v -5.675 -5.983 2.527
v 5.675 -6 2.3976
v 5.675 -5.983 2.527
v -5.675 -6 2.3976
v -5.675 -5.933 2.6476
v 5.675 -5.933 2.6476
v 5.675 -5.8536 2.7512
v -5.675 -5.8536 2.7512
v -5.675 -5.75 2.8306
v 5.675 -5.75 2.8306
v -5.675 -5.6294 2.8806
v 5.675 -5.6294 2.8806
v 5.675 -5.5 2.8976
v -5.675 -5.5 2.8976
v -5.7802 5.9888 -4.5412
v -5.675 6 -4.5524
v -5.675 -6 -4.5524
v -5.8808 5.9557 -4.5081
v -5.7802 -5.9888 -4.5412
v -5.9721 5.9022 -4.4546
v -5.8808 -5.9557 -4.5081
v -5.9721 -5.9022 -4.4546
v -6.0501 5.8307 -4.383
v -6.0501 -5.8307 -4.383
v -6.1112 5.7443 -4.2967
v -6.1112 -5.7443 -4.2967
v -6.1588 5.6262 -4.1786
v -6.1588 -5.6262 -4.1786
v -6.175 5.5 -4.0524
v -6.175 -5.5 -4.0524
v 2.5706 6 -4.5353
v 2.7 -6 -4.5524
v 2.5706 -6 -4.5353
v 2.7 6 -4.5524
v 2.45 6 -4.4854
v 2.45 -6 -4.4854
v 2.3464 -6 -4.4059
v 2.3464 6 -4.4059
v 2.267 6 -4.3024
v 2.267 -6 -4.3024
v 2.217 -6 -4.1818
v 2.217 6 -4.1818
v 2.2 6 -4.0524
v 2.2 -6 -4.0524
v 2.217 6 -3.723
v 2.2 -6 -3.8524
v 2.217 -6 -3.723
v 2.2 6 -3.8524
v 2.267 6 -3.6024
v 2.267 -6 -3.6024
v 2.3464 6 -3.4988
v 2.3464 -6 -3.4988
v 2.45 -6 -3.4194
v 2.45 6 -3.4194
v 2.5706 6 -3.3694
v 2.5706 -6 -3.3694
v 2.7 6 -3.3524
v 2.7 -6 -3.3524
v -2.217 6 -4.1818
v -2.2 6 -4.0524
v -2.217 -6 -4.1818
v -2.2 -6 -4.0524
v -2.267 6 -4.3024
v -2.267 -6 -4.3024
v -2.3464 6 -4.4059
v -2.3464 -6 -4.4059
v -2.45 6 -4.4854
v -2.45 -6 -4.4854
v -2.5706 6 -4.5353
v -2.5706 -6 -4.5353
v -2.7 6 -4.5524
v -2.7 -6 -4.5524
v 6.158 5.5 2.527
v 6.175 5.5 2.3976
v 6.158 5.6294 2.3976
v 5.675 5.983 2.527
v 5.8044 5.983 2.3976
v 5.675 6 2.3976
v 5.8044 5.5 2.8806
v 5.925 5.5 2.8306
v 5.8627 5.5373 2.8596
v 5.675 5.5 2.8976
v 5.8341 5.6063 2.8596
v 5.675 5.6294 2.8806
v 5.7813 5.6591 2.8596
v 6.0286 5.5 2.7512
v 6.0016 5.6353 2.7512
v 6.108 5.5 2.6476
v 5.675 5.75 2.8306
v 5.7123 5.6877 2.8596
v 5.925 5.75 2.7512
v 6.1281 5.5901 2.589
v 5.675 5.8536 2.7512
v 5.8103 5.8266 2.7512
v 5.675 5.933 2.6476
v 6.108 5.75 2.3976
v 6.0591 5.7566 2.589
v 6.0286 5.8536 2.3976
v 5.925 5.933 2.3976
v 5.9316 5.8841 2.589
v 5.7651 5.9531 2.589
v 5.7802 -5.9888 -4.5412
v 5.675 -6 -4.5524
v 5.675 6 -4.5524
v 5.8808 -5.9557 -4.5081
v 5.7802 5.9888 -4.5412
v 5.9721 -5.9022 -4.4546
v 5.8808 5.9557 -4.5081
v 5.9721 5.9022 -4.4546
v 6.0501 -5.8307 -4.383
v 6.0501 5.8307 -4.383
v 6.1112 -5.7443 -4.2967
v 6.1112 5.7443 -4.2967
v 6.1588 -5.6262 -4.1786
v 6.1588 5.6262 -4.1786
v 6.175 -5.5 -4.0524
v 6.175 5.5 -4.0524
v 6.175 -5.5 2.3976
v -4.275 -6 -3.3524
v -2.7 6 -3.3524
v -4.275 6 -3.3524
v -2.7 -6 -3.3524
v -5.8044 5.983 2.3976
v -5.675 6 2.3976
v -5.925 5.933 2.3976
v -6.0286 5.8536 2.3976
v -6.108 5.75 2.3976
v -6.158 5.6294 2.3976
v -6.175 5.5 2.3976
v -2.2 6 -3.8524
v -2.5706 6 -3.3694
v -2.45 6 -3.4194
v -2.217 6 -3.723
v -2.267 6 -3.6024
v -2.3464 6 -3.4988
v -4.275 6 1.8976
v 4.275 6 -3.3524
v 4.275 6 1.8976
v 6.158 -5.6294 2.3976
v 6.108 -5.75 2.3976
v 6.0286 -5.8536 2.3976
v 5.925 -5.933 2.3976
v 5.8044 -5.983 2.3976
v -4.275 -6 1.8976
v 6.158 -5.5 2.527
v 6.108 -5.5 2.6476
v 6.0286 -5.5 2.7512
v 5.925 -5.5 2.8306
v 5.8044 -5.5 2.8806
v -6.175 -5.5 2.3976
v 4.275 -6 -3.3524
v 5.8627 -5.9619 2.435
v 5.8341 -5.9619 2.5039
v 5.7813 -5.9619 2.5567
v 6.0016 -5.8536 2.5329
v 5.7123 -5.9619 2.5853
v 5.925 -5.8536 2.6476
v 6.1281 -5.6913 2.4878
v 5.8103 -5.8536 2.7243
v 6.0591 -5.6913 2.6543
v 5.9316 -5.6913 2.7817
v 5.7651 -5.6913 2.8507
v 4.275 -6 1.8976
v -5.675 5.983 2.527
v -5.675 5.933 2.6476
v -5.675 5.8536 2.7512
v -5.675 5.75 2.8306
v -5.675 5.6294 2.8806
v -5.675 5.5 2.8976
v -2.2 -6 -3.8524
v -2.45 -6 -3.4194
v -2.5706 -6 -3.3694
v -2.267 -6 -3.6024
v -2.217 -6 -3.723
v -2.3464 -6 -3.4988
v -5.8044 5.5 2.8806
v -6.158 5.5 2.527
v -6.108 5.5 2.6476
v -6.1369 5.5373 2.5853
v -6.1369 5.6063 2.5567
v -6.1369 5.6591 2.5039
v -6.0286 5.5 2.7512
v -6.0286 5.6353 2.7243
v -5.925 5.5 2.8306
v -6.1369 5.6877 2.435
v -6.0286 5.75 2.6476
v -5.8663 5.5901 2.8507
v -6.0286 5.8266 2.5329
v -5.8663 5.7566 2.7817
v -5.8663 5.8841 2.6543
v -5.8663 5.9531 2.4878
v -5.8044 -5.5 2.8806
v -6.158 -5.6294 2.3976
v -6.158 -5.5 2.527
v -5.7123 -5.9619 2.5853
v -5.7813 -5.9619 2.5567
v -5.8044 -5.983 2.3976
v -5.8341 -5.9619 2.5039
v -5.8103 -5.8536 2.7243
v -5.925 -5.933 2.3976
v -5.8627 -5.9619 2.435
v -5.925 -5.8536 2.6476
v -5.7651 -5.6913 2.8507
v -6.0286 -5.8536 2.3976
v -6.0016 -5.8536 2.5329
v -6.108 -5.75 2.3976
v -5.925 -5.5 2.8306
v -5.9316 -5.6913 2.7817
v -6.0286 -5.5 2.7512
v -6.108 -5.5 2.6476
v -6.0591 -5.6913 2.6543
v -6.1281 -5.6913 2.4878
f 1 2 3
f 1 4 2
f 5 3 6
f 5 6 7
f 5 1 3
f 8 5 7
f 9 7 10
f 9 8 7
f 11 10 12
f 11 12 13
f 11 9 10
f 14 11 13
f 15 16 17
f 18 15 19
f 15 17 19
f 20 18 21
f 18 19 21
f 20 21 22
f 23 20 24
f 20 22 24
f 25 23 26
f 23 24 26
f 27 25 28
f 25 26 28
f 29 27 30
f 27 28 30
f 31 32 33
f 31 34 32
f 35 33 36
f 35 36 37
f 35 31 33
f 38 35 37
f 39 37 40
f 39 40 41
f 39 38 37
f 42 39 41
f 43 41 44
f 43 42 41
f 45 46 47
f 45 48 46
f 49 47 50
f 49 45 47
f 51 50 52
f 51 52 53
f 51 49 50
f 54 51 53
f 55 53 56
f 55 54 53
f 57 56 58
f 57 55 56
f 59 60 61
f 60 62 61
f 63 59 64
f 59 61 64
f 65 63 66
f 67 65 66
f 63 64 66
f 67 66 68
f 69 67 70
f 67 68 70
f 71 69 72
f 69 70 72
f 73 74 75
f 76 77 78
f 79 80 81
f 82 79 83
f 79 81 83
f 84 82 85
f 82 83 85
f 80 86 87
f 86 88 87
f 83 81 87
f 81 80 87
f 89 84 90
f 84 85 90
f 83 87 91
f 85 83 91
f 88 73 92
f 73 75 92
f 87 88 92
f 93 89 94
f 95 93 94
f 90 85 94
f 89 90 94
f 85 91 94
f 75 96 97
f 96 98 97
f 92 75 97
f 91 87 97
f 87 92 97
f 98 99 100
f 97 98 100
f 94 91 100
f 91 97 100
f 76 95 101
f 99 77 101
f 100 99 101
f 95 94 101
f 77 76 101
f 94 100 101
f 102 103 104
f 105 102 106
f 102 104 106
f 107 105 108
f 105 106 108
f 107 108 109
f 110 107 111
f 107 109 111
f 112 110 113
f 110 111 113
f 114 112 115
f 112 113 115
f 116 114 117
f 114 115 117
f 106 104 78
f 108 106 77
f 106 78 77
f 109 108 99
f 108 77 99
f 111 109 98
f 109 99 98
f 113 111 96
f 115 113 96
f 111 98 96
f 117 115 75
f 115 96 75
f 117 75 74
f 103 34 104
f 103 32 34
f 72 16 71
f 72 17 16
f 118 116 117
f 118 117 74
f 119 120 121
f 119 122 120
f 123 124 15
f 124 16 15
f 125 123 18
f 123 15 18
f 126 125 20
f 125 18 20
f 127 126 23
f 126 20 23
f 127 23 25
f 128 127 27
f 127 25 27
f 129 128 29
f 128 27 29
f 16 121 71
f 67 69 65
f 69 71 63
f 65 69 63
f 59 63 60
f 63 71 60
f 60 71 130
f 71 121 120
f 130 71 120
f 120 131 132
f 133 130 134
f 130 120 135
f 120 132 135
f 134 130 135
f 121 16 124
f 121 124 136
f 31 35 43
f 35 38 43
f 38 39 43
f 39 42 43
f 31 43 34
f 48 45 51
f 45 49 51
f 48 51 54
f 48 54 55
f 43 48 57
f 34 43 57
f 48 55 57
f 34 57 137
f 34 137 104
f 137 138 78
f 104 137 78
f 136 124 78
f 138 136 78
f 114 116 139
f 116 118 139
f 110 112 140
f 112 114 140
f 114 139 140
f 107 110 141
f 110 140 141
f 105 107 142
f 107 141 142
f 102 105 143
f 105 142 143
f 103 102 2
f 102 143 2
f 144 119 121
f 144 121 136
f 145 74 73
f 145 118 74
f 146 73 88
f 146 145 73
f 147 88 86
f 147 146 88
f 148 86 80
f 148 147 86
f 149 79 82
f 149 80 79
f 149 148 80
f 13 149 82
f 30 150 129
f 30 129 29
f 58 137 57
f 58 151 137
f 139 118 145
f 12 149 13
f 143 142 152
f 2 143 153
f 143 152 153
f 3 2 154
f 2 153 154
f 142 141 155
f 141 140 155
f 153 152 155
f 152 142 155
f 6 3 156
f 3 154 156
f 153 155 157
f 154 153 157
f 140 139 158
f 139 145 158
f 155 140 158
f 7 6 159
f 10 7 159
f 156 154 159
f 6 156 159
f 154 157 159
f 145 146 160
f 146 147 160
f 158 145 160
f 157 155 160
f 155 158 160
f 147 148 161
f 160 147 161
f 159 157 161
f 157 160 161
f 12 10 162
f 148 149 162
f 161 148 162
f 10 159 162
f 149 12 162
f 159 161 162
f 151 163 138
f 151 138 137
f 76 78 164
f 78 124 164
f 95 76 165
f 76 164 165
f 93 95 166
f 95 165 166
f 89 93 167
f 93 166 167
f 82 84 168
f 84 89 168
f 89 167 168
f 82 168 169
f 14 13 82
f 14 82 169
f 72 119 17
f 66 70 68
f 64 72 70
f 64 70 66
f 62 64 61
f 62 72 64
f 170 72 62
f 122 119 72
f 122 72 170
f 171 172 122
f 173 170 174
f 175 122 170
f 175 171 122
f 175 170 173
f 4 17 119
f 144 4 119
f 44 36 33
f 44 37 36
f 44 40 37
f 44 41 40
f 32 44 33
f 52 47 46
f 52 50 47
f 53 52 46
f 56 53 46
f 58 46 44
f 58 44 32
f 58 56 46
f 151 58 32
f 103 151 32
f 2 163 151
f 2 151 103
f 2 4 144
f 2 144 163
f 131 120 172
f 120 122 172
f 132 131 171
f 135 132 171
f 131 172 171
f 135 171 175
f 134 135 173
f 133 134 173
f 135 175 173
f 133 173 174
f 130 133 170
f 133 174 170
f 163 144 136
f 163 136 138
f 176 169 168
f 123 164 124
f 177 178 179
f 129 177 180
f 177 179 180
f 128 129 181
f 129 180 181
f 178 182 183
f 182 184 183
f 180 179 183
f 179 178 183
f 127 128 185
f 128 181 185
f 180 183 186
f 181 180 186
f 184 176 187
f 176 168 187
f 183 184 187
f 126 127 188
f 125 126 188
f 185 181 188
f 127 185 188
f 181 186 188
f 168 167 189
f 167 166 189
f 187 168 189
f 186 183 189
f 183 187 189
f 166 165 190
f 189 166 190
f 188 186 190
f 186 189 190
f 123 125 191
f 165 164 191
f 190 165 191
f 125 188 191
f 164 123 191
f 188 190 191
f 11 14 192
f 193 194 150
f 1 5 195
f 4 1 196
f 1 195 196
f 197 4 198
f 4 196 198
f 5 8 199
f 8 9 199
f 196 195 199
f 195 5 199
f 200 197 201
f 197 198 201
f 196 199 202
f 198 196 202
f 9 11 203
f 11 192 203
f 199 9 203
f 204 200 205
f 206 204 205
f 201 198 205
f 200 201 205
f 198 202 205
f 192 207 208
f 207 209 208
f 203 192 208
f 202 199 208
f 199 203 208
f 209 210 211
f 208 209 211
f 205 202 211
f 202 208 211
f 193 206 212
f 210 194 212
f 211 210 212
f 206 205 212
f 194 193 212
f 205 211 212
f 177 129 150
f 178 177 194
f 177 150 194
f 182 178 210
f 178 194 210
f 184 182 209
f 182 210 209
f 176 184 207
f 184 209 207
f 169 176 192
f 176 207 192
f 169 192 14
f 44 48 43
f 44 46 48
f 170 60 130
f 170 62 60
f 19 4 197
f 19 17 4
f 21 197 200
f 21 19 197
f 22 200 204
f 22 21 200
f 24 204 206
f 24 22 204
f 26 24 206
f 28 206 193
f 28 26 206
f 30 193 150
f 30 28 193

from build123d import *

# Parameters (mm, degrees)
F1_DEPTH = 6
F2_R     = 0.5
F3_R     = 0.5


with BuildPart() as f1:
    # F0 (on Front) → F1 (new body, symmetric)
    with BuildSketch(Plane.XZ):
        Polygon((6.175, -4.5523648744), (6.175, 2.8976351256), (-6.175, 2.8976351256), (-6.175, -4.5523648744), (-2.2, -4.5523648744), (-2.2, -3.3523648744), (-4.275, -3.3523648744), (-4.275, 1.8976351256), (4.275, 1.8976351256), (4.275, -3.3523648744), (2.2, -3.3523648744), (2.2, -4.5523648744), align=None)
    extrude(amount=F1_DEPTH, both=True)

    # F2
    f2_edges = [f1.edges().sort_by_distance(p)[0] for p in [
        (-2.2, 0, -4.552365),
        (2.2, 0, -4.552365),
        (-2.2, 0, -3.352365),
        (2.2, 0, -3.352365),
    ]]
    fillet(f2_edges, radius=F2_R)

    # F3
    f3_edges = [f1.edges().sort_by_distance(p)[0] for p in [
        (6.175, 0, -4.552365),
        (6.175, 6, -0.827365),
        (6.175, 0, 2.897635),
        (6.175, -6, -0.827365),
        (0, 6, 2.897635),
        (-6.175, 0, 2.897635),
        (0, -6, 2.897635),
        (-6.175, 6, -0.827365),
        (-6.175, 0, -4.552365),
        (-6.175, -6, -0.827365),
    ]]
    fillet(f3_edges, radius=F3_R)


solid = f1.part
